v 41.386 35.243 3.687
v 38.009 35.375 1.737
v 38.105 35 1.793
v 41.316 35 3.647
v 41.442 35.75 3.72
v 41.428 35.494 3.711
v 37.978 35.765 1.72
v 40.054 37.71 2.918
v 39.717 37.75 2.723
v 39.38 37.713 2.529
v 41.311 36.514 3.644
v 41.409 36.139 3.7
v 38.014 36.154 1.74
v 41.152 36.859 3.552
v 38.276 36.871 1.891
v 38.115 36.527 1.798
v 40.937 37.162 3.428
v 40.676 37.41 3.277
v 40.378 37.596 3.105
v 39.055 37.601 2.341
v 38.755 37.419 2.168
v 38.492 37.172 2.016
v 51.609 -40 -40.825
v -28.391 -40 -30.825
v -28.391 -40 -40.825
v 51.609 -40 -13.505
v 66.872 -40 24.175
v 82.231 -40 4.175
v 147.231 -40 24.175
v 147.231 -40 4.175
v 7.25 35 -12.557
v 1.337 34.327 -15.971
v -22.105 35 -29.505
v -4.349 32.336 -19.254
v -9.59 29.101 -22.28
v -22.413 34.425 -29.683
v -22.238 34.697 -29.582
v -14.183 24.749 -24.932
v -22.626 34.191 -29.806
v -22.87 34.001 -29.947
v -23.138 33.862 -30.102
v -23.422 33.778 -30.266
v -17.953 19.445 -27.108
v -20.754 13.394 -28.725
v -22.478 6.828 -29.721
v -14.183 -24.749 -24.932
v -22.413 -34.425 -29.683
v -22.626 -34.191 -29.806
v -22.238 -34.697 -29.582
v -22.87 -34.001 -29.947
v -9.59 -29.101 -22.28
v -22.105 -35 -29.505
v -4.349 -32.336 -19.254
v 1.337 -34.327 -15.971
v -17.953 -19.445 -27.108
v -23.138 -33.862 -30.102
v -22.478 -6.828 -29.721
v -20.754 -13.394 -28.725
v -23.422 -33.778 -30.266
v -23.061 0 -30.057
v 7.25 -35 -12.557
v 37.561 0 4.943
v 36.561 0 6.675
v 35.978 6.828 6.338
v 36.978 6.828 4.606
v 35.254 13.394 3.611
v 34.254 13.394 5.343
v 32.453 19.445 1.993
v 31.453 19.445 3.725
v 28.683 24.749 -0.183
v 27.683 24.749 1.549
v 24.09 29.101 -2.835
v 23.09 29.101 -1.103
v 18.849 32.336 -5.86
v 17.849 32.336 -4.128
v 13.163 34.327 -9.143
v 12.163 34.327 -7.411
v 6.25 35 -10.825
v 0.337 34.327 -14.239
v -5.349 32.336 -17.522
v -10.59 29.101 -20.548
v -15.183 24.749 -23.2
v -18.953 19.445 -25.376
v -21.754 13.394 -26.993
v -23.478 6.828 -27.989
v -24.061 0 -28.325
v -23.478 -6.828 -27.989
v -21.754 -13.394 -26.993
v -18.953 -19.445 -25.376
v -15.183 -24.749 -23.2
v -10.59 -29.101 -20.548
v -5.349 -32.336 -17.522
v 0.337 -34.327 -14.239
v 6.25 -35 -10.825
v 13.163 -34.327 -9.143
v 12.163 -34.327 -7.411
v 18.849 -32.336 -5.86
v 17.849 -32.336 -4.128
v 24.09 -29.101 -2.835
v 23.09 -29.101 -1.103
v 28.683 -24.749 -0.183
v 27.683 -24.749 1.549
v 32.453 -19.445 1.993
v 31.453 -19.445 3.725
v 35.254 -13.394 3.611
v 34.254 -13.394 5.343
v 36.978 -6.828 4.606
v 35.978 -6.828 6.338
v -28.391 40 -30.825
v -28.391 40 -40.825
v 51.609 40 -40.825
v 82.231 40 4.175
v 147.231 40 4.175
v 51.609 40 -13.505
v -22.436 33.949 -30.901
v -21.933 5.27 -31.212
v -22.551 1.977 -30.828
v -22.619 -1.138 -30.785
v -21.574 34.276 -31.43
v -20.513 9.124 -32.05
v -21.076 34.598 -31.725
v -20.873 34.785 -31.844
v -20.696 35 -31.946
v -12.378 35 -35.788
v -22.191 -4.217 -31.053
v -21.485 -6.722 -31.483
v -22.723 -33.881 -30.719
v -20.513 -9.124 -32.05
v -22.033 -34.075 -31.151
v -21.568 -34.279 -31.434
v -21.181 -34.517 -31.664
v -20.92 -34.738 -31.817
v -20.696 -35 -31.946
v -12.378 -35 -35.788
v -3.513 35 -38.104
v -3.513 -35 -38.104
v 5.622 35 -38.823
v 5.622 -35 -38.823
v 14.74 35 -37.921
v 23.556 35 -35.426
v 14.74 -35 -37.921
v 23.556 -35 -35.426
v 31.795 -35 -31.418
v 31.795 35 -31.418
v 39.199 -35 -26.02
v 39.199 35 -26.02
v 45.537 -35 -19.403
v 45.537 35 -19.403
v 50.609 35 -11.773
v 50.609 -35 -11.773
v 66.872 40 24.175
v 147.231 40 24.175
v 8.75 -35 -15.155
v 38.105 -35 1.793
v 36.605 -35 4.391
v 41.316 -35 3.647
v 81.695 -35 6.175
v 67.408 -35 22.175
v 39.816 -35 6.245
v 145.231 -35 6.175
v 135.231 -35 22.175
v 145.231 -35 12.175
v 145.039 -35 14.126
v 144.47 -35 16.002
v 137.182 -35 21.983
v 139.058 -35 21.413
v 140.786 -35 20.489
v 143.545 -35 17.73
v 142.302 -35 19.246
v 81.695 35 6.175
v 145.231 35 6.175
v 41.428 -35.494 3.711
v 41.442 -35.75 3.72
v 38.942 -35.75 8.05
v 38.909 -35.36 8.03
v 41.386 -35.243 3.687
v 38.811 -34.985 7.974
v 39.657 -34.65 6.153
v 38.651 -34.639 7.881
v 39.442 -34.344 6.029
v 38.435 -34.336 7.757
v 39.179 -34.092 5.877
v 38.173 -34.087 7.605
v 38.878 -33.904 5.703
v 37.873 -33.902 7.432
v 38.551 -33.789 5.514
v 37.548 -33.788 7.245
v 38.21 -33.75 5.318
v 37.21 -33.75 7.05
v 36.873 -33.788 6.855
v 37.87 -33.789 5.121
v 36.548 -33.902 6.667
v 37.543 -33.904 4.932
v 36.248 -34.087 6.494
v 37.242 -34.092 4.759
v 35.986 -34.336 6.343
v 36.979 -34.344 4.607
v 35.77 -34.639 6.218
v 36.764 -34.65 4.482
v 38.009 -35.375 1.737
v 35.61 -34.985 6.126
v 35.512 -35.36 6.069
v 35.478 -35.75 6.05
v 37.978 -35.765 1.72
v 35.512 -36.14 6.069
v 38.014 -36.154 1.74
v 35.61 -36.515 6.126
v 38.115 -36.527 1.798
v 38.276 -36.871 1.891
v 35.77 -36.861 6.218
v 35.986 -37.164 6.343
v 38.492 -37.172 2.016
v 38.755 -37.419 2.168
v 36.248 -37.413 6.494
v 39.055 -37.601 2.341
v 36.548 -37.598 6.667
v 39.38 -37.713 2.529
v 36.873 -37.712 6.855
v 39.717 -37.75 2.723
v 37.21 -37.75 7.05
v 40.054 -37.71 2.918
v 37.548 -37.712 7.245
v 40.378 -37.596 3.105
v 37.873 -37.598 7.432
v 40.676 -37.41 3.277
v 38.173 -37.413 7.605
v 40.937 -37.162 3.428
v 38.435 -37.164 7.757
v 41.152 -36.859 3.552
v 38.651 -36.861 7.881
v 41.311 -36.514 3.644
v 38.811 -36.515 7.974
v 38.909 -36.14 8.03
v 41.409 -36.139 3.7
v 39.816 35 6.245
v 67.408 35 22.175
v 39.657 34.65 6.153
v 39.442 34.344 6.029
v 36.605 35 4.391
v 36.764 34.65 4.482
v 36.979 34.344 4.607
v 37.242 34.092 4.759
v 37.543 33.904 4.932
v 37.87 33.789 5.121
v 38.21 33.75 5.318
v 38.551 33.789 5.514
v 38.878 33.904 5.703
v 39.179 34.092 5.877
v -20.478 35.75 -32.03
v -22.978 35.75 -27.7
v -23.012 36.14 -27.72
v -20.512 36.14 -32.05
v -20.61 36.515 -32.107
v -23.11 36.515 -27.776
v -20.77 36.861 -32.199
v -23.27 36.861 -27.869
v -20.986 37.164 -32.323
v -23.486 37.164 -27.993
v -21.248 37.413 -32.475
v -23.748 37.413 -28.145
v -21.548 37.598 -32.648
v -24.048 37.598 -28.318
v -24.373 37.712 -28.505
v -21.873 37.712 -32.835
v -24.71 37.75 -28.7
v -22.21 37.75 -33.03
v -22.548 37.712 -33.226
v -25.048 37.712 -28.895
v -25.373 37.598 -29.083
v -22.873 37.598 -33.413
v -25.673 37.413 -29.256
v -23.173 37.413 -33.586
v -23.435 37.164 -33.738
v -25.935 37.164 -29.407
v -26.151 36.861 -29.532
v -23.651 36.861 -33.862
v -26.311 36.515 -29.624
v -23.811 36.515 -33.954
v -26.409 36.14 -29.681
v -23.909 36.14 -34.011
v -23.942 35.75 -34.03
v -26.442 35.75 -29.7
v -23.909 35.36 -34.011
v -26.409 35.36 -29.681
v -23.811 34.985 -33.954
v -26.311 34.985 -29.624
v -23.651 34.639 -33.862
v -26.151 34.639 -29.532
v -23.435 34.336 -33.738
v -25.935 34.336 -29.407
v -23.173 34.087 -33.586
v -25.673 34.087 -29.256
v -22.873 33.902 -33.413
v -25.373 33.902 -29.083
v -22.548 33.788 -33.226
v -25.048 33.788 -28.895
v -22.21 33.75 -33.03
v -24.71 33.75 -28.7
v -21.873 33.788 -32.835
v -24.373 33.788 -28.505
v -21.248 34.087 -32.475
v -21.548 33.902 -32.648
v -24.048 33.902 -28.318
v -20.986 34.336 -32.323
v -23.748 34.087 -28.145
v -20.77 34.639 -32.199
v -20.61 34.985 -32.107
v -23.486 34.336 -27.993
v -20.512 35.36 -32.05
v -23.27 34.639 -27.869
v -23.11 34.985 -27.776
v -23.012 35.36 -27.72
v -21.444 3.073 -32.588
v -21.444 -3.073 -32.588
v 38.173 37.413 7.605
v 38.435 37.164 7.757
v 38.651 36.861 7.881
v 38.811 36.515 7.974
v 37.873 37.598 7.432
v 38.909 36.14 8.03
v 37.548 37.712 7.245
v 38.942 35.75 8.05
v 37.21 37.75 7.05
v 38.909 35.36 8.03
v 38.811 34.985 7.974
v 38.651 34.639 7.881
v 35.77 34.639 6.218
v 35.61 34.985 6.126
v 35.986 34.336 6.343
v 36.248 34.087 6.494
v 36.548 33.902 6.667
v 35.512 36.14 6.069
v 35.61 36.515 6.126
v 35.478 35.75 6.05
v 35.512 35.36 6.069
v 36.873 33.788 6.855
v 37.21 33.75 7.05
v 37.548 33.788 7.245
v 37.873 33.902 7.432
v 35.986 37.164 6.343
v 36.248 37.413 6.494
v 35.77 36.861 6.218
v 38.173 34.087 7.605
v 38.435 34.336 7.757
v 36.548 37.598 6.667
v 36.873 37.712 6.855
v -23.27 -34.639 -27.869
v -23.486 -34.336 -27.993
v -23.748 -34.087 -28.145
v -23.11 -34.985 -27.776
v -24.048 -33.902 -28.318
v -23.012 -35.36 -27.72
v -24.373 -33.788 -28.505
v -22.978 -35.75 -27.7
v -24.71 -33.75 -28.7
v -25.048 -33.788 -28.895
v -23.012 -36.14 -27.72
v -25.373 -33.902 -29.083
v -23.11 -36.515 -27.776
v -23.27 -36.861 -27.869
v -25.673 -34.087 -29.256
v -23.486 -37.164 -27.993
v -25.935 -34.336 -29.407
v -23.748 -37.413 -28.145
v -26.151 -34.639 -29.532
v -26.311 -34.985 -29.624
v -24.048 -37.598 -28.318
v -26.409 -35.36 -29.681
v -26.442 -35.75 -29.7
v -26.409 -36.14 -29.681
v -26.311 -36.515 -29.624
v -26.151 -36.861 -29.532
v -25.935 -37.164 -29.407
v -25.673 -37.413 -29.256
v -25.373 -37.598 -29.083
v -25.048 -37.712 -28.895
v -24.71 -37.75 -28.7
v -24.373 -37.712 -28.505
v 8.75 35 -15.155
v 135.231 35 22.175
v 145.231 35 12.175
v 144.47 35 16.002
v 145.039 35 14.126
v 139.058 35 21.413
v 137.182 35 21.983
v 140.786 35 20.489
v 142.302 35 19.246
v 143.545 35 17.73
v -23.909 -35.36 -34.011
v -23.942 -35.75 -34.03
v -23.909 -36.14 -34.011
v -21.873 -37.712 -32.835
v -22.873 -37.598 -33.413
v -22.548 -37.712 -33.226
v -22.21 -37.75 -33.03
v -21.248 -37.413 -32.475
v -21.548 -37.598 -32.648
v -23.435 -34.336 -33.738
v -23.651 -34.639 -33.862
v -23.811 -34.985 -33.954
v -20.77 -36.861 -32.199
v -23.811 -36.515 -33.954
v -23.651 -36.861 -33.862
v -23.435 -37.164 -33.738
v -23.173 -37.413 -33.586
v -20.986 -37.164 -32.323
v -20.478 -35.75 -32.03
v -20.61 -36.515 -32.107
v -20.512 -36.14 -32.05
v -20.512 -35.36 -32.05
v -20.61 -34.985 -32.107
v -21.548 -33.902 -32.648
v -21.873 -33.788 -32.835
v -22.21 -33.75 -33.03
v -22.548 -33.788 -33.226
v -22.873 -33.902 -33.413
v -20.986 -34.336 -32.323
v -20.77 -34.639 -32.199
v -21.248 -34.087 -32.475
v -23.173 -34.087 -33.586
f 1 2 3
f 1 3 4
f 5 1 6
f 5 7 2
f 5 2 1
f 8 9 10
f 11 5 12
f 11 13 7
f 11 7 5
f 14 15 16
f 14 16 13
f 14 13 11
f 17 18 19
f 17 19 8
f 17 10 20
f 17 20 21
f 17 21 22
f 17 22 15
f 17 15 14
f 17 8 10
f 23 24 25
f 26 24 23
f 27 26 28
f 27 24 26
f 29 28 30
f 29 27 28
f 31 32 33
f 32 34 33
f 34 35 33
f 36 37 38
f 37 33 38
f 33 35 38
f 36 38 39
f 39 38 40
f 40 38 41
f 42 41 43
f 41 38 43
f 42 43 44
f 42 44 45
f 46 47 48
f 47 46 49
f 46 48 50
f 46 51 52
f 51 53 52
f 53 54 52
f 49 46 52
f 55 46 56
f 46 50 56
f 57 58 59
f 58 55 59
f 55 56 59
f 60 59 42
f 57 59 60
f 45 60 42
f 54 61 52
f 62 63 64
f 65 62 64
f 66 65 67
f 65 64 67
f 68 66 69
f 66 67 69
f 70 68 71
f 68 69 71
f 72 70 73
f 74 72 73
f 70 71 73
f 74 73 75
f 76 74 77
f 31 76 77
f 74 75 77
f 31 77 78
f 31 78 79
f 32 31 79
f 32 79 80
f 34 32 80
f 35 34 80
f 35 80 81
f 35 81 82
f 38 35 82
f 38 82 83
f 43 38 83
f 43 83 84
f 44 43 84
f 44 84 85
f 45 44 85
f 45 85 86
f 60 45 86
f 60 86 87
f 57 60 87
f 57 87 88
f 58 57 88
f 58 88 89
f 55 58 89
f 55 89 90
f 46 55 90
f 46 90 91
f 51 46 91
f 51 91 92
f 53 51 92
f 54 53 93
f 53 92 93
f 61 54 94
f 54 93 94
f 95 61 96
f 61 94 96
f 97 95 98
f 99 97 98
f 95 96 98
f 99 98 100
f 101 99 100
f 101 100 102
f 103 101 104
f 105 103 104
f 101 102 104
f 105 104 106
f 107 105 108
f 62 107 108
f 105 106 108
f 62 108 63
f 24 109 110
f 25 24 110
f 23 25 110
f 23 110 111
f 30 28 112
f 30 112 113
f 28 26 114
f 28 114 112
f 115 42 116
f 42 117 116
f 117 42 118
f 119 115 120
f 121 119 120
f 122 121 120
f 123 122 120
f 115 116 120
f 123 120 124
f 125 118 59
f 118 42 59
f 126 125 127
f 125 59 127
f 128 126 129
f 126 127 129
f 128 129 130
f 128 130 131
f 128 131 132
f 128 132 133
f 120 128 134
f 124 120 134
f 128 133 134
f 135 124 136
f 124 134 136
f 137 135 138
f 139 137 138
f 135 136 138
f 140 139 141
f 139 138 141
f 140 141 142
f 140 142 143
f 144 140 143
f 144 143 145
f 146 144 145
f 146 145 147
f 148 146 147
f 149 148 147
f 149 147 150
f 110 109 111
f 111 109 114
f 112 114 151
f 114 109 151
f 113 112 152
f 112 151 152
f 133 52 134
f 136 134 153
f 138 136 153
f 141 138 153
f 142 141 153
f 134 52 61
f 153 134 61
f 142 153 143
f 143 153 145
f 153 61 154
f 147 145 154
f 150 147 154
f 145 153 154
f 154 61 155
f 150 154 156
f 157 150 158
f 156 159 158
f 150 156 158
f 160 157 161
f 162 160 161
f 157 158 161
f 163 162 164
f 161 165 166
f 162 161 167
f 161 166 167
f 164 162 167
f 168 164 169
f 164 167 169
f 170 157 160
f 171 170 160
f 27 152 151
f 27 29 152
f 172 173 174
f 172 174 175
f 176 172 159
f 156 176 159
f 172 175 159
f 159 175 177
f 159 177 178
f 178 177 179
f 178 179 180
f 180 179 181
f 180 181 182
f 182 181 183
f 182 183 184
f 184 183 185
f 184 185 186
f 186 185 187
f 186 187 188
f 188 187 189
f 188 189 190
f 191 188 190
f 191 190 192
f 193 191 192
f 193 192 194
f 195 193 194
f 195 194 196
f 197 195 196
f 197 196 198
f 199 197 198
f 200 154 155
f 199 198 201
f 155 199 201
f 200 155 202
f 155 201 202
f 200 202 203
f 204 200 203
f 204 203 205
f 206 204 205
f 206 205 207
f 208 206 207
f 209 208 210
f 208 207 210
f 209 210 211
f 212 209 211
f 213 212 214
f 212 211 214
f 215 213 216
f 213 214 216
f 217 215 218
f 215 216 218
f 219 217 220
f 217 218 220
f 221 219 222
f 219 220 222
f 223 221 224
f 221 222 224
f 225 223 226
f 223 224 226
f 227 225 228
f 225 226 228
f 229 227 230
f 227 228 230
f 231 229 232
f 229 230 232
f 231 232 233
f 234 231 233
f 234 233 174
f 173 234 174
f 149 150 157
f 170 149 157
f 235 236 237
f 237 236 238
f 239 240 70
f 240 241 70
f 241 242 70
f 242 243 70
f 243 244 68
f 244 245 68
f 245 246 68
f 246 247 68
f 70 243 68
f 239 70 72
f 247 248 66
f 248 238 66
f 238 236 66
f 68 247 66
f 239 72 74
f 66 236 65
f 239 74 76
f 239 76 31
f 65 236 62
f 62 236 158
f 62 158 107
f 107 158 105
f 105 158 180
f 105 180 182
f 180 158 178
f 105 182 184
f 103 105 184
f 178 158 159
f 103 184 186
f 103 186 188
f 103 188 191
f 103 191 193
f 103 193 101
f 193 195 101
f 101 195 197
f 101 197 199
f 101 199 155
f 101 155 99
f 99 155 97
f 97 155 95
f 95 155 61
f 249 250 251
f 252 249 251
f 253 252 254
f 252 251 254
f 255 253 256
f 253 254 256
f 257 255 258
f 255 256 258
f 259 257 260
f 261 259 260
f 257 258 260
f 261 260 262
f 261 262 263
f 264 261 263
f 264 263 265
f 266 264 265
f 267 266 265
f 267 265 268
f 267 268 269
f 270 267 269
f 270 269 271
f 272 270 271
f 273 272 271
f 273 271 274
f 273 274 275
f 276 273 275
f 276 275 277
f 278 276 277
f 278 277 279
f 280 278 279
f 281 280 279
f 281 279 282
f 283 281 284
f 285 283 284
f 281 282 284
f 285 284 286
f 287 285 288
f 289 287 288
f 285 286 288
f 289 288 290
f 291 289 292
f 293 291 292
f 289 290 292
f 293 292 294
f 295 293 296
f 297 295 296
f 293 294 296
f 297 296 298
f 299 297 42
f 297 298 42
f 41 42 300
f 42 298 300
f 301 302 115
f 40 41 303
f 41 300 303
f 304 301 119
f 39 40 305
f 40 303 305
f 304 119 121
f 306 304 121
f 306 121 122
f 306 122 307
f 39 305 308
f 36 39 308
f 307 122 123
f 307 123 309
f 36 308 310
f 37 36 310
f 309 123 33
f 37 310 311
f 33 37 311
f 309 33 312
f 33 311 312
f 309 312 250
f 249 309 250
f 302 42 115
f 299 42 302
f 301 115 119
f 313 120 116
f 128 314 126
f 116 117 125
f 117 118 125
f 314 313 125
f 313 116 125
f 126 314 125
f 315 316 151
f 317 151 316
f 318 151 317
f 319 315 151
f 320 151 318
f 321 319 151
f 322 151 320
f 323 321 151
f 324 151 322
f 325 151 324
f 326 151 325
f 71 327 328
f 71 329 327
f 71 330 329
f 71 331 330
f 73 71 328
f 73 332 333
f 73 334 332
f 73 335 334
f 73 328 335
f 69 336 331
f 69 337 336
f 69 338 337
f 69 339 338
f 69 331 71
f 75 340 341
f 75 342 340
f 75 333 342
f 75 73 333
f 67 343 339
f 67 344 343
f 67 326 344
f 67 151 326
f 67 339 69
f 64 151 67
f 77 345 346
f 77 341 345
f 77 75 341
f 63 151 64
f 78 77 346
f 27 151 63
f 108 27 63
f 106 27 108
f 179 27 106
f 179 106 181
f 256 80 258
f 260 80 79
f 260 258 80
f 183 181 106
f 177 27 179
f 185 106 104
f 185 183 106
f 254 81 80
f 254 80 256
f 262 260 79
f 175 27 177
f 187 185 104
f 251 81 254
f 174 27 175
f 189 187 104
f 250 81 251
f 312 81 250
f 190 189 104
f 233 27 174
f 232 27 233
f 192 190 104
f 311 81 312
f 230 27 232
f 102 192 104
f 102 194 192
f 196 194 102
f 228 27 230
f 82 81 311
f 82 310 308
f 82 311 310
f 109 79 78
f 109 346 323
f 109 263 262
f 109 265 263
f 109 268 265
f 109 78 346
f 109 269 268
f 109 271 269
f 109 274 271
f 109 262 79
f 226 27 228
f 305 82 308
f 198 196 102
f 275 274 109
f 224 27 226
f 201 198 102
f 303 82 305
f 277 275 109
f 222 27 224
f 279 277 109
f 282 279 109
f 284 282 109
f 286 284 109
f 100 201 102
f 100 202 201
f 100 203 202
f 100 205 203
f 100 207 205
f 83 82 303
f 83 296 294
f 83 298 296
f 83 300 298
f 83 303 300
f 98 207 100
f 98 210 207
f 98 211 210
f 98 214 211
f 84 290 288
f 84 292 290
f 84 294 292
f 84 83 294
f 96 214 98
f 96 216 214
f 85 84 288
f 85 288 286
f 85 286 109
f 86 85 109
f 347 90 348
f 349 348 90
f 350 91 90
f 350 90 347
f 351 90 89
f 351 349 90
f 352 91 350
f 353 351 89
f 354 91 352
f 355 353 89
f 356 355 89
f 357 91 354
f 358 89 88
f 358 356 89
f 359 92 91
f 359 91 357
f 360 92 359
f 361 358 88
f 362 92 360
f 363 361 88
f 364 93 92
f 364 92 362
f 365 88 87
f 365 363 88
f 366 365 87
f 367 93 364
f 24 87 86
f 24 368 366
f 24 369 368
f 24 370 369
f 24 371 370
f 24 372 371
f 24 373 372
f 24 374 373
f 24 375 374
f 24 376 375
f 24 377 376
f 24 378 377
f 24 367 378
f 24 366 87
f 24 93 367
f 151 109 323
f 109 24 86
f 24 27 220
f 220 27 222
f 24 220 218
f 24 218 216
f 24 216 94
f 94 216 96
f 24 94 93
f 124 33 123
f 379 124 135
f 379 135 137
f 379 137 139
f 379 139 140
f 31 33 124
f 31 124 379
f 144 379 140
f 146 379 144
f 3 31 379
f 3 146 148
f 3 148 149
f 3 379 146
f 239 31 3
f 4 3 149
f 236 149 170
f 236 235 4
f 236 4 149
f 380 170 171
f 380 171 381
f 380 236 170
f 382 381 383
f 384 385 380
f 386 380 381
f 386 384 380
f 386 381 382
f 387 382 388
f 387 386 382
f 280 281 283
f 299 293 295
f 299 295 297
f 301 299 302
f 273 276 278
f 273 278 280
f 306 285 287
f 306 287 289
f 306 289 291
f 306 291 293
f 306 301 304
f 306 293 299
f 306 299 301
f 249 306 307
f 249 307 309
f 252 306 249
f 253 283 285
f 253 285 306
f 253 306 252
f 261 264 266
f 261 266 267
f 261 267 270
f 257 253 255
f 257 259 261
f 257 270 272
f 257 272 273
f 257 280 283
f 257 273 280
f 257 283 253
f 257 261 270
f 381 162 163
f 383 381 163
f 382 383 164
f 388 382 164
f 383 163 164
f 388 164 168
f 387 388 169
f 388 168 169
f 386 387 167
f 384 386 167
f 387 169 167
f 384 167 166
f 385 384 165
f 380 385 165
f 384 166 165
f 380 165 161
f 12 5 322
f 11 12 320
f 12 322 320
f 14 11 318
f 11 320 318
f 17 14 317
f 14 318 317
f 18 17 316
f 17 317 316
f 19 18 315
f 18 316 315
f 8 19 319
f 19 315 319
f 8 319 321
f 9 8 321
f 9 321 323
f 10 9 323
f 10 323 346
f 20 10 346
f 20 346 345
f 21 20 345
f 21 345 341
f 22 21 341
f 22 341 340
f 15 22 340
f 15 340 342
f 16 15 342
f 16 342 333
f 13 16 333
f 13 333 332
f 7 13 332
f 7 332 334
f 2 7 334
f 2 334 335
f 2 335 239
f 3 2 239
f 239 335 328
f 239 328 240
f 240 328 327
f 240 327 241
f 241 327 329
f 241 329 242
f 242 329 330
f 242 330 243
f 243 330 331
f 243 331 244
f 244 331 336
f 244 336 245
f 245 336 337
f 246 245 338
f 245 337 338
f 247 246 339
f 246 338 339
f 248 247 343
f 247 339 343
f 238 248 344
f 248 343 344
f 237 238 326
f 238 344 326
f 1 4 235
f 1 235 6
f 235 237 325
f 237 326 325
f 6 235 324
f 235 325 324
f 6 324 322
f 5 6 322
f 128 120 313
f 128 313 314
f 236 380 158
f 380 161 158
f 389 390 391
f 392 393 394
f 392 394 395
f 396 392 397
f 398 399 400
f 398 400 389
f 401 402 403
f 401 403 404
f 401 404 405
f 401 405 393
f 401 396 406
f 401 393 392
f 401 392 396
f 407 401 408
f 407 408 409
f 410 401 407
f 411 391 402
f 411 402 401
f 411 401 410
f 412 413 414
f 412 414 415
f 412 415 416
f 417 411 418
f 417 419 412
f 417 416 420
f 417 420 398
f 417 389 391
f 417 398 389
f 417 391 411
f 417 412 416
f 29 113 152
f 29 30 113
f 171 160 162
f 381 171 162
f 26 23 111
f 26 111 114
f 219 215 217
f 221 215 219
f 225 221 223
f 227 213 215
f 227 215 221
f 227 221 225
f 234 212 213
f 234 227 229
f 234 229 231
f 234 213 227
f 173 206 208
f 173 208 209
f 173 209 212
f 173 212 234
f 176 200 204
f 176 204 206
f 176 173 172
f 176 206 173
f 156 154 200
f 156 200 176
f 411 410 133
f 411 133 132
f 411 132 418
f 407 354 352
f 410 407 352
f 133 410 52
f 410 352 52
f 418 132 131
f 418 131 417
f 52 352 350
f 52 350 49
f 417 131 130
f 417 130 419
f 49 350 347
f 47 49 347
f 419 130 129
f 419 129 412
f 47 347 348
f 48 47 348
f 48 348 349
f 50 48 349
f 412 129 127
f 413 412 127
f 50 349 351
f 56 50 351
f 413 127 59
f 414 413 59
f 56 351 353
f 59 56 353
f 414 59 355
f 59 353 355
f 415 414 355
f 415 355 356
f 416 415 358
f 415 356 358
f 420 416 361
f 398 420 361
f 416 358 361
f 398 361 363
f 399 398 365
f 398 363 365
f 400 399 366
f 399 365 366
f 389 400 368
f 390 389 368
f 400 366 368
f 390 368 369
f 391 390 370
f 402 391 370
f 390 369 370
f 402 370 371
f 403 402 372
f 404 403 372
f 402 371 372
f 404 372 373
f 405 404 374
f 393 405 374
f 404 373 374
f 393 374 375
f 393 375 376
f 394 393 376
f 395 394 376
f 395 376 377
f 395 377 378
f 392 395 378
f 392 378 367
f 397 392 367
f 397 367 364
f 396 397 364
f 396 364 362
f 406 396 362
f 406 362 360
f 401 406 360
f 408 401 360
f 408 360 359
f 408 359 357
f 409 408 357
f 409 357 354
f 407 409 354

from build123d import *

# Parameters (mm, degrees)
F1_DEPTH = 40
F3_DEPTH = 35
F4_R     = 35
F4_R_2   = 2
F5_DEPTH = 5


with BuildPart() as f1:
    # F0 (on Front) → F1 (new body, symmetric)
    with BuildSketch(Plane.XZ):
        Polygon((66.8717782649, 24.1746824527), (40.8910161514, 9.1746824527), (-28.3910161514, -30.8253175473), (-28.3910161514, -40.8253175473), (51.6089838486, -40.8253175473), (51.6089838486, -13.5048094716), (82.2307621135, 4.1746824527), (147.2307621135, 4.1746824527), (147.2307621135, 24.1746824527), align=None)
    extrude(amount=F1_DEPTH, both=True)

    # F2 (on Front) → F3 (cut, symmetric)
    with BuildSketch(Plane.XZ):
        with BuildLine():
            ThreePointArc((-23.4223891848, -30.2660805074), (17.6554756717, -37.2808918374), (50.6089838486, -11.772758664))
            Line((50.6089838486, -11.772758664), (81.6948637287, 6.1746824527))
            Line((81.6948637287, 6.1746824527), (145.2307621135, 6.1746824527))
            Line((145.2307621135, 6.1746824527), (145.2307621135, 12.1746824527))
            ThreePointArc((145.2307621135, 12.1746824527), (142.3018299254, 19.2457502646), (135.2307621135, 22.1746824527))
            Line((135.2307621135, 22.1746824527), (67.4076766498, 22.1746824527))
            Line((67.4076766498, 22.1746824527), (-23.4223891848, -30.2660805074))
        make_face()
    extrude(amount=F3_DEPTH, both=True, mode=Mode.SUBTRACT)

    # F4 (on face) → F5 (cut)
    with BuildSketch(Plane(origin=(6.25, 0, -10.8253175473), x_dir=(0.8660254038, 0, 0.5), z_dir=(-0.5, 0, 0.8660254038))):
        Circle(F4_R)
        with Locations((-35.75, 35.75)):
            Circle(F4_R_2)
        with Locations((35.75, 35.75)):
            Circle(F4_R_2)
        with Locations((35.75, -35.75)):
            Circle(F4_R_2)
        with Locations((-35.75, -35.75)):
            Circle(F4_R_2)
    extrude(amount=-F5_DEPTH, mode=Mode.SUBTRACT)


solid = f1.part
